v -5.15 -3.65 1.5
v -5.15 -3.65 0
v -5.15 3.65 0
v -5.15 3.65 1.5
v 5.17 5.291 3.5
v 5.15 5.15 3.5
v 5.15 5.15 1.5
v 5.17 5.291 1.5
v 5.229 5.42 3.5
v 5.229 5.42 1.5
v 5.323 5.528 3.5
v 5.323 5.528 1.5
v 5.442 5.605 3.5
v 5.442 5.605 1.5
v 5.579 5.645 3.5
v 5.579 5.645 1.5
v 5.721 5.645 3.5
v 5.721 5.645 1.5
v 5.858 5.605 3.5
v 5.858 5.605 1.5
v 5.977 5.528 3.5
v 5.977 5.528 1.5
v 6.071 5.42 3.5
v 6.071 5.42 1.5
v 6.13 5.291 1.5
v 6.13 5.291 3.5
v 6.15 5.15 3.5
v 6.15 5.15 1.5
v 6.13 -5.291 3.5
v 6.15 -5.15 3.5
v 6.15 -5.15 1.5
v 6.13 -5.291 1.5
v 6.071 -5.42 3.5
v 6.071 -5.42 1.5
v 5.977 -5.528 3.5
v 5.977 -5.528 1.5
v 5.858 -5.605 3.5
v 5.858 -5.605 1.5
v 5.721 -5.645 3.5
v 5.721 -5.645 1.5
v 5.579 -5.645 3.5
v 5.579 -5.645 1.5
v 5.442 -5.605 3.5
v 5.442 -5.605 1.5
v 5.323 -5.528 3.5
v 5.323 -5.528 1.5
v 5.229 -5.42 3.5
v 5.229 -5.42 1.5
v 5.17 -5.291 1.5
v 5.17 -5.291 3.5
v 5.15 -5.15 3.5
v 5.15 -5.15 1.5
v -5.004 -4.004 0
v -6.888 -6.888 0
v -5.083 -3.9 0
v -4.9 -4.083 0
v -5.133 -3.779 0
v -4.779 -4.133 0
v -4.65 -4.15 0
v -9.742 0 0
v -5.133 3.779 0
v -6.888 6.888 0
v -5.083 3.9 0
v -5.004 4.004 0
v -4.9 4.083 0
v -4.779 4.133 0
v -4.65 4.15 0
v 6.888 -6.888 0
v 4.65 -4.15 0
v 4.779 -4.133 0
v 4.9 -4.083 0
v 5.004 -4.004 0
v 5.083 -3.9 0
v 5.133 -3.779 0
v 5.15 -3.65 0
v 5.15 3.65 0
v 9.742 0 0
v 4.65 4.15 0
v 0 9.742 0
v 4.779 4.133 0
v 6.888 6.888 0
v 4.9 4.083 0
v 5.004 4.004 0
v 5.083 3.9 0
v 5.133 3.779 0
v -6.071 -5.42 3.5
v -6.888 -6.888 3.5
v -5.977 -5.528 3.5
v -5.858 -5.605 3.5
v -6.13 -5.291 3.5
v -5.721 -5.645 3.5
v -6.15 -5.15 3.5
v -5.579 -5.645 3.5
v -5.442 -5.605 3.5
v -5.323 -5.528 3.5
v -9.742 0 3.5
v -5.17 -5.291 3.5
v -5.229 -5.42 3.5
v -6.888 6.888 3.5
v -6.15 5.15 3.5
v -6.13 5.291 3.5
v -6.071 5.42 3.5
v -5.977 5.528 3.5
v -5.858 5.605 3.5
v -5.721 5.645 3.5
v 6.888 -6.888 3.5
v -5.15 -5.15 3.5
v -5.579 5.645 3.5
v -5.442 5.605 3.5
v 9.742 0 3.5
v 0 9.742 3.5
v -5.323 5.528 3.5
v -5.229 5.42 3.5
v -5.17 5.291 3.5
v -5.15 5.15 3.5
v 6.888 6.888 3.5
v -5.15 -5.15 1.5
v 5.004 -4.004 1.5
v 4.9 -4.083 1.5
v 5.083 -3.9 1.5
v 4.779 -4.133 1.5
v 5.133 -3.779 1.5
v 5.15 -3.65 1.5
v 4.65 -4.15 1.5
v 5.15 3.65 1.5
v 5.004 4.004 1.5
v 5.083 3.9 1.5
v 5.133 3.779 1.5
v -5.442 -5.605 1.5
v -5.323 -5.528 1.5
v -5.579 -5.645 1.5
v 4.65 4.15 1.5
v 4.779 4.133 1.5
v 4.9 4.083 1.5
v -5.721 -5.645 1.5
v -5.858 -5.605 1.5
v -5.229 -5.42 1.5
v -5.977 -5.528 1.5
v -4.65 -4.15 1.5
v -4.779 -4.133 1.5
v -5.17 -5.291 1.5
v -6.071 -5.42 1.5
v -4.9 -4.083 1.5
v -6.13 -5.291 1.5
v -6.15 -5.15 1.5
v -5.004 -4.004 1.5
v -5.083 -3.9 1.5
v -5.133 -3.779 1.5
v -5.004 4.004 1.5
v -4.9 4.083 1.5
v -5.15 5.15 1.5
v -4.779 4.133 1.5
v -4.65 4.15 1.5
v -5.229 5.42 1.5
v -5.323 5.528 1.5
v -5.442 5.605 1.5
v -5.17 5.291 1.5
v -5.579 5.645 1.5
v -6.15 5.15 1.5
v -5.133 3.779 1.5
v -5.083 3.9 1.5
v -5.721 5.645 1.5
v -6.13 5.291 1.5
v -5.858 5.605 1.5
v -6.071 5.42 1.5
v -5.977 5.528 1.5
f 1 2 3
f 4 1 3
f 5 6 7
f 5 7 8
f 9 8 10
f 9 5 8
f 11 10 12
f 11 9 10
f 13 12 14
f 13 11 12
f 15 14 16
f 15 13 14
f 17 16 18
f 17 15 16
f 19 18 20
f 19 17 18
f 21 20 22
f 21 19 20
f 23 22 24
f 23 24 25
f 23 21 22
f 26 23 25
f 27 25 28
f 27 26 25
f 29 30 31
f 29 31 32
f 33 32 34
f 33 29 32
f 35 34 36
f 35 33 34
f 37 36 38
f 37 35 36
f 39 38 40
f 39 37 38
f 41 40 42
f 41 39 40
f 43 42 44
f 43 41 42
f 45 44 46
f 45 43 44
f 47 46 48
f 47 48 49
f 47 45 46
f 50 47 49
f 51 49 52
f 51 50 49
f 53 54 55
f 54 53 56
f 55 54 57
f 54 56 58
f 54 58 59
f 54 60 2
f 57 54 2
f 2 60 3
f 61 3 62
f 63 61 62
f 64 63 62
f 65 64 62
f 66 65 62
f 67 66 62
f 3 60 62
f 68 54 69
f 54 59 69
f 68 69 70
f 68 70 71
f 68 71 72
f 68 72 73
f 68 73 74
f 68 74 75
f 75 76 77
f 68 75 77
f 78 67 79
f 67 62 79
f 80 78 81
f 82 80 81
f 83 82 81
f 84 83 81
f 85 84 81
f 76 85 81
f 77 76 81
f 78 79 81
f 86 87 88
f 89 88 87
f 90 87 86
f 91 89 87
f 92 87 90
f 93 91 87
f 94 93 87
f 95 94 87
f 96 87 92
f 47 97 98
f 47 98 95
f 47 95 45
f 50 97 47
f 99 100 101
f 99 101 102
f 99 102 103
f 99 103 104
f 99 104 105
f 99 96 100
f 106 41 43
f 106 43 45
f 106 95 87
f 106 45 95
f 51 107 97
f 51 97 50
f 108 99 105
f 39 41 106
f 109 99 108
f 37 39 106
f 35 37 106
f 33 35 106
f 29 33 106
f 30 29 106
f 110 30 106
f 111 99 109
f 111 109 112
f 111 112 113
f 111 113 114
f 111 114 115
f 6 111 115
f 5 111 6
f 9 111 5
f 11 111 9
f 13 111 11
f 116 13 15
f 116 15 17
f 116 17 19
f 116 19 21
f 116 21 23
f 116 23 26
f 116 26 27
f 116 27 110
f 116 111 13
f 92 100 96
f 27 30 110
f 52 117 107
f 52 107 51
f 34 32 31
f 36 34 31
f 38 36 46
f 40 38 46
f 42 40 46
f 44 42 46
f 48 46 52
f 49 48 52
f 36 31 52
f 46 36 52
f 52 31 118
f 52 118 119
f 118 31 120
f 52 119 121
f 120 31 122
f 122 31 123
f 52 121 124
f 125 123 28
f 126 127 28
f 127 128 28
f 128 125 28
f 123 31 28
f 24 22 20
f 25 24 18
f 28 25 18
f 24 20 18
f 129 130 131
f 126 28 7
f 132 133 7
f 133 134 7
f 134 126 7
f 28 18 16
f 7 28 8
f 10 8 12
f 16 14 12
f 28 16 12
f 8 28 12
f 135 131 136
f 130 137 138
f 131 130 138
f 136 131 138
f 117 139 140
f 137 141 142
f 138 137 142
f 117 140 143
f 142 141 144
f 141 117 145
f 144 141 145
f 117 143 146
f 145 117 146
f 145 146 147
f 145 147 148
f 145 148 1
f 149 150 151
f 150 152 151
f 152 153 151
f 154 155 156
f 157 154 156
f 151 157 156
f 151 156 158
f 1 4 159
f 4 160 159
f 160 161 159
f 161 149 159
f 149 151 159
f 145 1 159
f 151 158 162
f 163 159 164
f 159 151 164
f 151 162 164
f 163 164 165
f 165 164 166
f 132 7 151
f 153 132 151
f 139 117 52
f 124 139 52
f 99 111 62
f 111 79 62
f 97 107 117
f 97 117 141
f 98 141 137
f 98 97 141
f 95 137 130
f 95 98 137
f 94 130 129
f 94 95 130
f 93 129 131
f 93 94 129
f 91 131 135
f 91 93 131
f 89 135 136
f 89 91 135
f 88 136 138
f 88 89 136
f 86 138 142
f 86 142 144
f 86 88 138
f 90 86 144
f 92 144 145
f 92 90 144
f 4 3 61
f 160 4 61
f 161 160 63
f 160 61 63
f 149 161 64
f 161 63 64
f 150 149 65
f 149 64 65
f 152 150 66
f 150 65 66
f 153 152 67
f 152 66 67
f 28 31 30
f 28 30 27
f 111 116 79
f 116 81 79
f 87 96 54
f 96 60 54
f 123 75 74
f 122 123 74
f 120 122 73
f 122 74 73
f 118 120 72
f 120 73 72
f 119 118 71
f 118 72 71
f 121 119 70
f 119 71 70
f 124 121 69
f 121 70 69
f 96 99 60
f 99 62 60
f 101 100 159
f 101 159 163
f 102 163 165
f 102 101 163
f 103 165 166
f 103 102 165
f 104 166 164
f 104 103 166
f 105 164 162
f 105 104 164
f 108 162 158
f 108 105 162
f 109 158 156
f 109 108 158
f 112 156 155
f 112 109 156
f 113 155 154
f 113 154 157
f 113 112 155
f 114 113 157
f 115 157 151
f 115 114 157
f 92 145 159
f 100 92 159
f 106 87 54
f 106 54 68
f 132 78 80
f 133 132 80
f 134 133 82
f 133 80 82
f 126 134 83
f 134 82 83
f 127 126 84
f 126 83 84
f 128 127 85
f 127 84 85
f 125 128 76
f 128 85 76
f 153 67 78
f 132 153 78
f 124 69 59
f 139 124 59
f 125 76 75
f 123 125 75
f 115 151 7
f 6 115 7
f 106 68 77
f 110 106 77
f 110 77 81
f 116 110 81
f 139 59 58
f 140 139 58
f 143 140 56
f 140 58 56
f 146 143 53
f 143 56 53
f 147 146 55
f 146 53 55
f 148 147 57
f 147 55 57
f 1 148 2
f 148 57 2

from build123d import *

# Parameters (mm, degrees)
BOSS_EXTRUDE1_DEPTH = 1.5
SKETCH2_W           = 12.3
SKETCH2_H           = 10.3
BOSS_EXTRUDE2_DEPTH = 2
CUT_EXTRUDE1_DEPTH  = 2
CUT_EXTRUDE2_REACH  = 5.5


with BuildPart() as part:
    # Sketch1 → Boss-Extrude1 (new body)
    with BuildSketch(Plane.XY):
        Polygon((6.888301783, 6.888301783), (0, 9.741529803), (-6.888301783, 6.888301783), (-9.741529803, 0), (-6.888301783, -6.888301783), (0, -9.741529803), (6.888301783, -6.888301783), (9.741529803, 0), align=None)
        with BuildLine():
            Line((-5.15, -3.65), (-5.15, 3.65))
            ThreePointArc((-5.15, 3.65), (-5.003553391, 4.003553391), (-4.65, 4.15))
            Line((-4.65, 4.15), (4.65, 4.15))
            ThreePointArc((4.65, 4.15), (5.003553391, 4.003553391), (5.15, 3.65))
            Line((5.15, 3.65), (5.15, -3.65))
            ThreePointArc((5.15, -3.65), (5.003553391, -4.003553391), (4.65, -4.15))
            Line((4.65, -4.15), (-4.65, -4.15))
            ThreePointArc((-4.65, -4.15), (-5.003553391, -4.003553391), (-5.15, -3.65))
        make_face(mode=Mode.SUBTRACT)
    extrude(amount=BOSS_EXTRUDE1_DEPTH)

    # Sketch2 → Boss-Extrude2 (add)
    with BuildSketch(Plane.XY.offset(1.5)):
        Polygon((9.741529803, 0), (6.888301783, 6.888301783), (0, 9.741529803), (-6.888301783, 6.888301783), (-9.741529803, 0), (-6.888301783, -6.888301783), (0, -9.741529803), (6.888301783, -6.888301783), align=None)
        Rectangle(SKETCH2_W, SKETCH2_H, mode=Mode.SUBTRACT)
    extrude(amount=BOSS_EXTRUDE2_DEPTH)

    # Sketch3 → Cut-Extrude1 (cut)
    with BuildSketch(Plane.XY.offset(3.5)):
        with BuildLine():
            Line((-6.15, -5.15), (-6.15, 5.15))
            ThreePointArc((-6.15, 5.15), (-5.65, 5.65), (-5.15, 5.15))
            Line((-5.15, 5.15), (-5.15, -5.15))
            ThreePointArc((-5.15, -5.15), (-5.65, -5.65), (-6.15, -5.15))
        make_face()
        with BuildLine():
            Line((5.15, -5.15), (5.15, 5.15))
            ThreePointArc((5.15, 5.15), (5.65, 5.65), (6.15, 5.15))
            Line((6.15, 5.15), (6.15, -5.15))
            ThreePointArc((6.15, -5.15), (5.65, -5.65), (5.15, -5.15))
        make_face()
    extrude(amount=-CUT_EXTRUDE1_DEPTH, mode=Mode.SUBTRACT)

    # Sketch4 → Cut-Extrude2 (cut, up to next)
    with BuildSketch(Plane.XY.offset(3.5), mode=Mode.PRIVATE) as cut_extrude2_sk1:
        Polygon((-6.888301783, -6.888301783), (6.888301783, -6.888301783), (0, -9.741529803), align=None)
    cut_extrude2_tool1 = extrude(cut_extrude2_sk1.sketch, amount=-CUT_EXTRUDE2_REACH, mode=Mode.PRIVATE) & part.part
    add(cut_extrude2_tool1.solids().sort_by_distance((0, -7.839378, 3.5))[0], mode=Mode.SUBTRACT)


solid = part.part
